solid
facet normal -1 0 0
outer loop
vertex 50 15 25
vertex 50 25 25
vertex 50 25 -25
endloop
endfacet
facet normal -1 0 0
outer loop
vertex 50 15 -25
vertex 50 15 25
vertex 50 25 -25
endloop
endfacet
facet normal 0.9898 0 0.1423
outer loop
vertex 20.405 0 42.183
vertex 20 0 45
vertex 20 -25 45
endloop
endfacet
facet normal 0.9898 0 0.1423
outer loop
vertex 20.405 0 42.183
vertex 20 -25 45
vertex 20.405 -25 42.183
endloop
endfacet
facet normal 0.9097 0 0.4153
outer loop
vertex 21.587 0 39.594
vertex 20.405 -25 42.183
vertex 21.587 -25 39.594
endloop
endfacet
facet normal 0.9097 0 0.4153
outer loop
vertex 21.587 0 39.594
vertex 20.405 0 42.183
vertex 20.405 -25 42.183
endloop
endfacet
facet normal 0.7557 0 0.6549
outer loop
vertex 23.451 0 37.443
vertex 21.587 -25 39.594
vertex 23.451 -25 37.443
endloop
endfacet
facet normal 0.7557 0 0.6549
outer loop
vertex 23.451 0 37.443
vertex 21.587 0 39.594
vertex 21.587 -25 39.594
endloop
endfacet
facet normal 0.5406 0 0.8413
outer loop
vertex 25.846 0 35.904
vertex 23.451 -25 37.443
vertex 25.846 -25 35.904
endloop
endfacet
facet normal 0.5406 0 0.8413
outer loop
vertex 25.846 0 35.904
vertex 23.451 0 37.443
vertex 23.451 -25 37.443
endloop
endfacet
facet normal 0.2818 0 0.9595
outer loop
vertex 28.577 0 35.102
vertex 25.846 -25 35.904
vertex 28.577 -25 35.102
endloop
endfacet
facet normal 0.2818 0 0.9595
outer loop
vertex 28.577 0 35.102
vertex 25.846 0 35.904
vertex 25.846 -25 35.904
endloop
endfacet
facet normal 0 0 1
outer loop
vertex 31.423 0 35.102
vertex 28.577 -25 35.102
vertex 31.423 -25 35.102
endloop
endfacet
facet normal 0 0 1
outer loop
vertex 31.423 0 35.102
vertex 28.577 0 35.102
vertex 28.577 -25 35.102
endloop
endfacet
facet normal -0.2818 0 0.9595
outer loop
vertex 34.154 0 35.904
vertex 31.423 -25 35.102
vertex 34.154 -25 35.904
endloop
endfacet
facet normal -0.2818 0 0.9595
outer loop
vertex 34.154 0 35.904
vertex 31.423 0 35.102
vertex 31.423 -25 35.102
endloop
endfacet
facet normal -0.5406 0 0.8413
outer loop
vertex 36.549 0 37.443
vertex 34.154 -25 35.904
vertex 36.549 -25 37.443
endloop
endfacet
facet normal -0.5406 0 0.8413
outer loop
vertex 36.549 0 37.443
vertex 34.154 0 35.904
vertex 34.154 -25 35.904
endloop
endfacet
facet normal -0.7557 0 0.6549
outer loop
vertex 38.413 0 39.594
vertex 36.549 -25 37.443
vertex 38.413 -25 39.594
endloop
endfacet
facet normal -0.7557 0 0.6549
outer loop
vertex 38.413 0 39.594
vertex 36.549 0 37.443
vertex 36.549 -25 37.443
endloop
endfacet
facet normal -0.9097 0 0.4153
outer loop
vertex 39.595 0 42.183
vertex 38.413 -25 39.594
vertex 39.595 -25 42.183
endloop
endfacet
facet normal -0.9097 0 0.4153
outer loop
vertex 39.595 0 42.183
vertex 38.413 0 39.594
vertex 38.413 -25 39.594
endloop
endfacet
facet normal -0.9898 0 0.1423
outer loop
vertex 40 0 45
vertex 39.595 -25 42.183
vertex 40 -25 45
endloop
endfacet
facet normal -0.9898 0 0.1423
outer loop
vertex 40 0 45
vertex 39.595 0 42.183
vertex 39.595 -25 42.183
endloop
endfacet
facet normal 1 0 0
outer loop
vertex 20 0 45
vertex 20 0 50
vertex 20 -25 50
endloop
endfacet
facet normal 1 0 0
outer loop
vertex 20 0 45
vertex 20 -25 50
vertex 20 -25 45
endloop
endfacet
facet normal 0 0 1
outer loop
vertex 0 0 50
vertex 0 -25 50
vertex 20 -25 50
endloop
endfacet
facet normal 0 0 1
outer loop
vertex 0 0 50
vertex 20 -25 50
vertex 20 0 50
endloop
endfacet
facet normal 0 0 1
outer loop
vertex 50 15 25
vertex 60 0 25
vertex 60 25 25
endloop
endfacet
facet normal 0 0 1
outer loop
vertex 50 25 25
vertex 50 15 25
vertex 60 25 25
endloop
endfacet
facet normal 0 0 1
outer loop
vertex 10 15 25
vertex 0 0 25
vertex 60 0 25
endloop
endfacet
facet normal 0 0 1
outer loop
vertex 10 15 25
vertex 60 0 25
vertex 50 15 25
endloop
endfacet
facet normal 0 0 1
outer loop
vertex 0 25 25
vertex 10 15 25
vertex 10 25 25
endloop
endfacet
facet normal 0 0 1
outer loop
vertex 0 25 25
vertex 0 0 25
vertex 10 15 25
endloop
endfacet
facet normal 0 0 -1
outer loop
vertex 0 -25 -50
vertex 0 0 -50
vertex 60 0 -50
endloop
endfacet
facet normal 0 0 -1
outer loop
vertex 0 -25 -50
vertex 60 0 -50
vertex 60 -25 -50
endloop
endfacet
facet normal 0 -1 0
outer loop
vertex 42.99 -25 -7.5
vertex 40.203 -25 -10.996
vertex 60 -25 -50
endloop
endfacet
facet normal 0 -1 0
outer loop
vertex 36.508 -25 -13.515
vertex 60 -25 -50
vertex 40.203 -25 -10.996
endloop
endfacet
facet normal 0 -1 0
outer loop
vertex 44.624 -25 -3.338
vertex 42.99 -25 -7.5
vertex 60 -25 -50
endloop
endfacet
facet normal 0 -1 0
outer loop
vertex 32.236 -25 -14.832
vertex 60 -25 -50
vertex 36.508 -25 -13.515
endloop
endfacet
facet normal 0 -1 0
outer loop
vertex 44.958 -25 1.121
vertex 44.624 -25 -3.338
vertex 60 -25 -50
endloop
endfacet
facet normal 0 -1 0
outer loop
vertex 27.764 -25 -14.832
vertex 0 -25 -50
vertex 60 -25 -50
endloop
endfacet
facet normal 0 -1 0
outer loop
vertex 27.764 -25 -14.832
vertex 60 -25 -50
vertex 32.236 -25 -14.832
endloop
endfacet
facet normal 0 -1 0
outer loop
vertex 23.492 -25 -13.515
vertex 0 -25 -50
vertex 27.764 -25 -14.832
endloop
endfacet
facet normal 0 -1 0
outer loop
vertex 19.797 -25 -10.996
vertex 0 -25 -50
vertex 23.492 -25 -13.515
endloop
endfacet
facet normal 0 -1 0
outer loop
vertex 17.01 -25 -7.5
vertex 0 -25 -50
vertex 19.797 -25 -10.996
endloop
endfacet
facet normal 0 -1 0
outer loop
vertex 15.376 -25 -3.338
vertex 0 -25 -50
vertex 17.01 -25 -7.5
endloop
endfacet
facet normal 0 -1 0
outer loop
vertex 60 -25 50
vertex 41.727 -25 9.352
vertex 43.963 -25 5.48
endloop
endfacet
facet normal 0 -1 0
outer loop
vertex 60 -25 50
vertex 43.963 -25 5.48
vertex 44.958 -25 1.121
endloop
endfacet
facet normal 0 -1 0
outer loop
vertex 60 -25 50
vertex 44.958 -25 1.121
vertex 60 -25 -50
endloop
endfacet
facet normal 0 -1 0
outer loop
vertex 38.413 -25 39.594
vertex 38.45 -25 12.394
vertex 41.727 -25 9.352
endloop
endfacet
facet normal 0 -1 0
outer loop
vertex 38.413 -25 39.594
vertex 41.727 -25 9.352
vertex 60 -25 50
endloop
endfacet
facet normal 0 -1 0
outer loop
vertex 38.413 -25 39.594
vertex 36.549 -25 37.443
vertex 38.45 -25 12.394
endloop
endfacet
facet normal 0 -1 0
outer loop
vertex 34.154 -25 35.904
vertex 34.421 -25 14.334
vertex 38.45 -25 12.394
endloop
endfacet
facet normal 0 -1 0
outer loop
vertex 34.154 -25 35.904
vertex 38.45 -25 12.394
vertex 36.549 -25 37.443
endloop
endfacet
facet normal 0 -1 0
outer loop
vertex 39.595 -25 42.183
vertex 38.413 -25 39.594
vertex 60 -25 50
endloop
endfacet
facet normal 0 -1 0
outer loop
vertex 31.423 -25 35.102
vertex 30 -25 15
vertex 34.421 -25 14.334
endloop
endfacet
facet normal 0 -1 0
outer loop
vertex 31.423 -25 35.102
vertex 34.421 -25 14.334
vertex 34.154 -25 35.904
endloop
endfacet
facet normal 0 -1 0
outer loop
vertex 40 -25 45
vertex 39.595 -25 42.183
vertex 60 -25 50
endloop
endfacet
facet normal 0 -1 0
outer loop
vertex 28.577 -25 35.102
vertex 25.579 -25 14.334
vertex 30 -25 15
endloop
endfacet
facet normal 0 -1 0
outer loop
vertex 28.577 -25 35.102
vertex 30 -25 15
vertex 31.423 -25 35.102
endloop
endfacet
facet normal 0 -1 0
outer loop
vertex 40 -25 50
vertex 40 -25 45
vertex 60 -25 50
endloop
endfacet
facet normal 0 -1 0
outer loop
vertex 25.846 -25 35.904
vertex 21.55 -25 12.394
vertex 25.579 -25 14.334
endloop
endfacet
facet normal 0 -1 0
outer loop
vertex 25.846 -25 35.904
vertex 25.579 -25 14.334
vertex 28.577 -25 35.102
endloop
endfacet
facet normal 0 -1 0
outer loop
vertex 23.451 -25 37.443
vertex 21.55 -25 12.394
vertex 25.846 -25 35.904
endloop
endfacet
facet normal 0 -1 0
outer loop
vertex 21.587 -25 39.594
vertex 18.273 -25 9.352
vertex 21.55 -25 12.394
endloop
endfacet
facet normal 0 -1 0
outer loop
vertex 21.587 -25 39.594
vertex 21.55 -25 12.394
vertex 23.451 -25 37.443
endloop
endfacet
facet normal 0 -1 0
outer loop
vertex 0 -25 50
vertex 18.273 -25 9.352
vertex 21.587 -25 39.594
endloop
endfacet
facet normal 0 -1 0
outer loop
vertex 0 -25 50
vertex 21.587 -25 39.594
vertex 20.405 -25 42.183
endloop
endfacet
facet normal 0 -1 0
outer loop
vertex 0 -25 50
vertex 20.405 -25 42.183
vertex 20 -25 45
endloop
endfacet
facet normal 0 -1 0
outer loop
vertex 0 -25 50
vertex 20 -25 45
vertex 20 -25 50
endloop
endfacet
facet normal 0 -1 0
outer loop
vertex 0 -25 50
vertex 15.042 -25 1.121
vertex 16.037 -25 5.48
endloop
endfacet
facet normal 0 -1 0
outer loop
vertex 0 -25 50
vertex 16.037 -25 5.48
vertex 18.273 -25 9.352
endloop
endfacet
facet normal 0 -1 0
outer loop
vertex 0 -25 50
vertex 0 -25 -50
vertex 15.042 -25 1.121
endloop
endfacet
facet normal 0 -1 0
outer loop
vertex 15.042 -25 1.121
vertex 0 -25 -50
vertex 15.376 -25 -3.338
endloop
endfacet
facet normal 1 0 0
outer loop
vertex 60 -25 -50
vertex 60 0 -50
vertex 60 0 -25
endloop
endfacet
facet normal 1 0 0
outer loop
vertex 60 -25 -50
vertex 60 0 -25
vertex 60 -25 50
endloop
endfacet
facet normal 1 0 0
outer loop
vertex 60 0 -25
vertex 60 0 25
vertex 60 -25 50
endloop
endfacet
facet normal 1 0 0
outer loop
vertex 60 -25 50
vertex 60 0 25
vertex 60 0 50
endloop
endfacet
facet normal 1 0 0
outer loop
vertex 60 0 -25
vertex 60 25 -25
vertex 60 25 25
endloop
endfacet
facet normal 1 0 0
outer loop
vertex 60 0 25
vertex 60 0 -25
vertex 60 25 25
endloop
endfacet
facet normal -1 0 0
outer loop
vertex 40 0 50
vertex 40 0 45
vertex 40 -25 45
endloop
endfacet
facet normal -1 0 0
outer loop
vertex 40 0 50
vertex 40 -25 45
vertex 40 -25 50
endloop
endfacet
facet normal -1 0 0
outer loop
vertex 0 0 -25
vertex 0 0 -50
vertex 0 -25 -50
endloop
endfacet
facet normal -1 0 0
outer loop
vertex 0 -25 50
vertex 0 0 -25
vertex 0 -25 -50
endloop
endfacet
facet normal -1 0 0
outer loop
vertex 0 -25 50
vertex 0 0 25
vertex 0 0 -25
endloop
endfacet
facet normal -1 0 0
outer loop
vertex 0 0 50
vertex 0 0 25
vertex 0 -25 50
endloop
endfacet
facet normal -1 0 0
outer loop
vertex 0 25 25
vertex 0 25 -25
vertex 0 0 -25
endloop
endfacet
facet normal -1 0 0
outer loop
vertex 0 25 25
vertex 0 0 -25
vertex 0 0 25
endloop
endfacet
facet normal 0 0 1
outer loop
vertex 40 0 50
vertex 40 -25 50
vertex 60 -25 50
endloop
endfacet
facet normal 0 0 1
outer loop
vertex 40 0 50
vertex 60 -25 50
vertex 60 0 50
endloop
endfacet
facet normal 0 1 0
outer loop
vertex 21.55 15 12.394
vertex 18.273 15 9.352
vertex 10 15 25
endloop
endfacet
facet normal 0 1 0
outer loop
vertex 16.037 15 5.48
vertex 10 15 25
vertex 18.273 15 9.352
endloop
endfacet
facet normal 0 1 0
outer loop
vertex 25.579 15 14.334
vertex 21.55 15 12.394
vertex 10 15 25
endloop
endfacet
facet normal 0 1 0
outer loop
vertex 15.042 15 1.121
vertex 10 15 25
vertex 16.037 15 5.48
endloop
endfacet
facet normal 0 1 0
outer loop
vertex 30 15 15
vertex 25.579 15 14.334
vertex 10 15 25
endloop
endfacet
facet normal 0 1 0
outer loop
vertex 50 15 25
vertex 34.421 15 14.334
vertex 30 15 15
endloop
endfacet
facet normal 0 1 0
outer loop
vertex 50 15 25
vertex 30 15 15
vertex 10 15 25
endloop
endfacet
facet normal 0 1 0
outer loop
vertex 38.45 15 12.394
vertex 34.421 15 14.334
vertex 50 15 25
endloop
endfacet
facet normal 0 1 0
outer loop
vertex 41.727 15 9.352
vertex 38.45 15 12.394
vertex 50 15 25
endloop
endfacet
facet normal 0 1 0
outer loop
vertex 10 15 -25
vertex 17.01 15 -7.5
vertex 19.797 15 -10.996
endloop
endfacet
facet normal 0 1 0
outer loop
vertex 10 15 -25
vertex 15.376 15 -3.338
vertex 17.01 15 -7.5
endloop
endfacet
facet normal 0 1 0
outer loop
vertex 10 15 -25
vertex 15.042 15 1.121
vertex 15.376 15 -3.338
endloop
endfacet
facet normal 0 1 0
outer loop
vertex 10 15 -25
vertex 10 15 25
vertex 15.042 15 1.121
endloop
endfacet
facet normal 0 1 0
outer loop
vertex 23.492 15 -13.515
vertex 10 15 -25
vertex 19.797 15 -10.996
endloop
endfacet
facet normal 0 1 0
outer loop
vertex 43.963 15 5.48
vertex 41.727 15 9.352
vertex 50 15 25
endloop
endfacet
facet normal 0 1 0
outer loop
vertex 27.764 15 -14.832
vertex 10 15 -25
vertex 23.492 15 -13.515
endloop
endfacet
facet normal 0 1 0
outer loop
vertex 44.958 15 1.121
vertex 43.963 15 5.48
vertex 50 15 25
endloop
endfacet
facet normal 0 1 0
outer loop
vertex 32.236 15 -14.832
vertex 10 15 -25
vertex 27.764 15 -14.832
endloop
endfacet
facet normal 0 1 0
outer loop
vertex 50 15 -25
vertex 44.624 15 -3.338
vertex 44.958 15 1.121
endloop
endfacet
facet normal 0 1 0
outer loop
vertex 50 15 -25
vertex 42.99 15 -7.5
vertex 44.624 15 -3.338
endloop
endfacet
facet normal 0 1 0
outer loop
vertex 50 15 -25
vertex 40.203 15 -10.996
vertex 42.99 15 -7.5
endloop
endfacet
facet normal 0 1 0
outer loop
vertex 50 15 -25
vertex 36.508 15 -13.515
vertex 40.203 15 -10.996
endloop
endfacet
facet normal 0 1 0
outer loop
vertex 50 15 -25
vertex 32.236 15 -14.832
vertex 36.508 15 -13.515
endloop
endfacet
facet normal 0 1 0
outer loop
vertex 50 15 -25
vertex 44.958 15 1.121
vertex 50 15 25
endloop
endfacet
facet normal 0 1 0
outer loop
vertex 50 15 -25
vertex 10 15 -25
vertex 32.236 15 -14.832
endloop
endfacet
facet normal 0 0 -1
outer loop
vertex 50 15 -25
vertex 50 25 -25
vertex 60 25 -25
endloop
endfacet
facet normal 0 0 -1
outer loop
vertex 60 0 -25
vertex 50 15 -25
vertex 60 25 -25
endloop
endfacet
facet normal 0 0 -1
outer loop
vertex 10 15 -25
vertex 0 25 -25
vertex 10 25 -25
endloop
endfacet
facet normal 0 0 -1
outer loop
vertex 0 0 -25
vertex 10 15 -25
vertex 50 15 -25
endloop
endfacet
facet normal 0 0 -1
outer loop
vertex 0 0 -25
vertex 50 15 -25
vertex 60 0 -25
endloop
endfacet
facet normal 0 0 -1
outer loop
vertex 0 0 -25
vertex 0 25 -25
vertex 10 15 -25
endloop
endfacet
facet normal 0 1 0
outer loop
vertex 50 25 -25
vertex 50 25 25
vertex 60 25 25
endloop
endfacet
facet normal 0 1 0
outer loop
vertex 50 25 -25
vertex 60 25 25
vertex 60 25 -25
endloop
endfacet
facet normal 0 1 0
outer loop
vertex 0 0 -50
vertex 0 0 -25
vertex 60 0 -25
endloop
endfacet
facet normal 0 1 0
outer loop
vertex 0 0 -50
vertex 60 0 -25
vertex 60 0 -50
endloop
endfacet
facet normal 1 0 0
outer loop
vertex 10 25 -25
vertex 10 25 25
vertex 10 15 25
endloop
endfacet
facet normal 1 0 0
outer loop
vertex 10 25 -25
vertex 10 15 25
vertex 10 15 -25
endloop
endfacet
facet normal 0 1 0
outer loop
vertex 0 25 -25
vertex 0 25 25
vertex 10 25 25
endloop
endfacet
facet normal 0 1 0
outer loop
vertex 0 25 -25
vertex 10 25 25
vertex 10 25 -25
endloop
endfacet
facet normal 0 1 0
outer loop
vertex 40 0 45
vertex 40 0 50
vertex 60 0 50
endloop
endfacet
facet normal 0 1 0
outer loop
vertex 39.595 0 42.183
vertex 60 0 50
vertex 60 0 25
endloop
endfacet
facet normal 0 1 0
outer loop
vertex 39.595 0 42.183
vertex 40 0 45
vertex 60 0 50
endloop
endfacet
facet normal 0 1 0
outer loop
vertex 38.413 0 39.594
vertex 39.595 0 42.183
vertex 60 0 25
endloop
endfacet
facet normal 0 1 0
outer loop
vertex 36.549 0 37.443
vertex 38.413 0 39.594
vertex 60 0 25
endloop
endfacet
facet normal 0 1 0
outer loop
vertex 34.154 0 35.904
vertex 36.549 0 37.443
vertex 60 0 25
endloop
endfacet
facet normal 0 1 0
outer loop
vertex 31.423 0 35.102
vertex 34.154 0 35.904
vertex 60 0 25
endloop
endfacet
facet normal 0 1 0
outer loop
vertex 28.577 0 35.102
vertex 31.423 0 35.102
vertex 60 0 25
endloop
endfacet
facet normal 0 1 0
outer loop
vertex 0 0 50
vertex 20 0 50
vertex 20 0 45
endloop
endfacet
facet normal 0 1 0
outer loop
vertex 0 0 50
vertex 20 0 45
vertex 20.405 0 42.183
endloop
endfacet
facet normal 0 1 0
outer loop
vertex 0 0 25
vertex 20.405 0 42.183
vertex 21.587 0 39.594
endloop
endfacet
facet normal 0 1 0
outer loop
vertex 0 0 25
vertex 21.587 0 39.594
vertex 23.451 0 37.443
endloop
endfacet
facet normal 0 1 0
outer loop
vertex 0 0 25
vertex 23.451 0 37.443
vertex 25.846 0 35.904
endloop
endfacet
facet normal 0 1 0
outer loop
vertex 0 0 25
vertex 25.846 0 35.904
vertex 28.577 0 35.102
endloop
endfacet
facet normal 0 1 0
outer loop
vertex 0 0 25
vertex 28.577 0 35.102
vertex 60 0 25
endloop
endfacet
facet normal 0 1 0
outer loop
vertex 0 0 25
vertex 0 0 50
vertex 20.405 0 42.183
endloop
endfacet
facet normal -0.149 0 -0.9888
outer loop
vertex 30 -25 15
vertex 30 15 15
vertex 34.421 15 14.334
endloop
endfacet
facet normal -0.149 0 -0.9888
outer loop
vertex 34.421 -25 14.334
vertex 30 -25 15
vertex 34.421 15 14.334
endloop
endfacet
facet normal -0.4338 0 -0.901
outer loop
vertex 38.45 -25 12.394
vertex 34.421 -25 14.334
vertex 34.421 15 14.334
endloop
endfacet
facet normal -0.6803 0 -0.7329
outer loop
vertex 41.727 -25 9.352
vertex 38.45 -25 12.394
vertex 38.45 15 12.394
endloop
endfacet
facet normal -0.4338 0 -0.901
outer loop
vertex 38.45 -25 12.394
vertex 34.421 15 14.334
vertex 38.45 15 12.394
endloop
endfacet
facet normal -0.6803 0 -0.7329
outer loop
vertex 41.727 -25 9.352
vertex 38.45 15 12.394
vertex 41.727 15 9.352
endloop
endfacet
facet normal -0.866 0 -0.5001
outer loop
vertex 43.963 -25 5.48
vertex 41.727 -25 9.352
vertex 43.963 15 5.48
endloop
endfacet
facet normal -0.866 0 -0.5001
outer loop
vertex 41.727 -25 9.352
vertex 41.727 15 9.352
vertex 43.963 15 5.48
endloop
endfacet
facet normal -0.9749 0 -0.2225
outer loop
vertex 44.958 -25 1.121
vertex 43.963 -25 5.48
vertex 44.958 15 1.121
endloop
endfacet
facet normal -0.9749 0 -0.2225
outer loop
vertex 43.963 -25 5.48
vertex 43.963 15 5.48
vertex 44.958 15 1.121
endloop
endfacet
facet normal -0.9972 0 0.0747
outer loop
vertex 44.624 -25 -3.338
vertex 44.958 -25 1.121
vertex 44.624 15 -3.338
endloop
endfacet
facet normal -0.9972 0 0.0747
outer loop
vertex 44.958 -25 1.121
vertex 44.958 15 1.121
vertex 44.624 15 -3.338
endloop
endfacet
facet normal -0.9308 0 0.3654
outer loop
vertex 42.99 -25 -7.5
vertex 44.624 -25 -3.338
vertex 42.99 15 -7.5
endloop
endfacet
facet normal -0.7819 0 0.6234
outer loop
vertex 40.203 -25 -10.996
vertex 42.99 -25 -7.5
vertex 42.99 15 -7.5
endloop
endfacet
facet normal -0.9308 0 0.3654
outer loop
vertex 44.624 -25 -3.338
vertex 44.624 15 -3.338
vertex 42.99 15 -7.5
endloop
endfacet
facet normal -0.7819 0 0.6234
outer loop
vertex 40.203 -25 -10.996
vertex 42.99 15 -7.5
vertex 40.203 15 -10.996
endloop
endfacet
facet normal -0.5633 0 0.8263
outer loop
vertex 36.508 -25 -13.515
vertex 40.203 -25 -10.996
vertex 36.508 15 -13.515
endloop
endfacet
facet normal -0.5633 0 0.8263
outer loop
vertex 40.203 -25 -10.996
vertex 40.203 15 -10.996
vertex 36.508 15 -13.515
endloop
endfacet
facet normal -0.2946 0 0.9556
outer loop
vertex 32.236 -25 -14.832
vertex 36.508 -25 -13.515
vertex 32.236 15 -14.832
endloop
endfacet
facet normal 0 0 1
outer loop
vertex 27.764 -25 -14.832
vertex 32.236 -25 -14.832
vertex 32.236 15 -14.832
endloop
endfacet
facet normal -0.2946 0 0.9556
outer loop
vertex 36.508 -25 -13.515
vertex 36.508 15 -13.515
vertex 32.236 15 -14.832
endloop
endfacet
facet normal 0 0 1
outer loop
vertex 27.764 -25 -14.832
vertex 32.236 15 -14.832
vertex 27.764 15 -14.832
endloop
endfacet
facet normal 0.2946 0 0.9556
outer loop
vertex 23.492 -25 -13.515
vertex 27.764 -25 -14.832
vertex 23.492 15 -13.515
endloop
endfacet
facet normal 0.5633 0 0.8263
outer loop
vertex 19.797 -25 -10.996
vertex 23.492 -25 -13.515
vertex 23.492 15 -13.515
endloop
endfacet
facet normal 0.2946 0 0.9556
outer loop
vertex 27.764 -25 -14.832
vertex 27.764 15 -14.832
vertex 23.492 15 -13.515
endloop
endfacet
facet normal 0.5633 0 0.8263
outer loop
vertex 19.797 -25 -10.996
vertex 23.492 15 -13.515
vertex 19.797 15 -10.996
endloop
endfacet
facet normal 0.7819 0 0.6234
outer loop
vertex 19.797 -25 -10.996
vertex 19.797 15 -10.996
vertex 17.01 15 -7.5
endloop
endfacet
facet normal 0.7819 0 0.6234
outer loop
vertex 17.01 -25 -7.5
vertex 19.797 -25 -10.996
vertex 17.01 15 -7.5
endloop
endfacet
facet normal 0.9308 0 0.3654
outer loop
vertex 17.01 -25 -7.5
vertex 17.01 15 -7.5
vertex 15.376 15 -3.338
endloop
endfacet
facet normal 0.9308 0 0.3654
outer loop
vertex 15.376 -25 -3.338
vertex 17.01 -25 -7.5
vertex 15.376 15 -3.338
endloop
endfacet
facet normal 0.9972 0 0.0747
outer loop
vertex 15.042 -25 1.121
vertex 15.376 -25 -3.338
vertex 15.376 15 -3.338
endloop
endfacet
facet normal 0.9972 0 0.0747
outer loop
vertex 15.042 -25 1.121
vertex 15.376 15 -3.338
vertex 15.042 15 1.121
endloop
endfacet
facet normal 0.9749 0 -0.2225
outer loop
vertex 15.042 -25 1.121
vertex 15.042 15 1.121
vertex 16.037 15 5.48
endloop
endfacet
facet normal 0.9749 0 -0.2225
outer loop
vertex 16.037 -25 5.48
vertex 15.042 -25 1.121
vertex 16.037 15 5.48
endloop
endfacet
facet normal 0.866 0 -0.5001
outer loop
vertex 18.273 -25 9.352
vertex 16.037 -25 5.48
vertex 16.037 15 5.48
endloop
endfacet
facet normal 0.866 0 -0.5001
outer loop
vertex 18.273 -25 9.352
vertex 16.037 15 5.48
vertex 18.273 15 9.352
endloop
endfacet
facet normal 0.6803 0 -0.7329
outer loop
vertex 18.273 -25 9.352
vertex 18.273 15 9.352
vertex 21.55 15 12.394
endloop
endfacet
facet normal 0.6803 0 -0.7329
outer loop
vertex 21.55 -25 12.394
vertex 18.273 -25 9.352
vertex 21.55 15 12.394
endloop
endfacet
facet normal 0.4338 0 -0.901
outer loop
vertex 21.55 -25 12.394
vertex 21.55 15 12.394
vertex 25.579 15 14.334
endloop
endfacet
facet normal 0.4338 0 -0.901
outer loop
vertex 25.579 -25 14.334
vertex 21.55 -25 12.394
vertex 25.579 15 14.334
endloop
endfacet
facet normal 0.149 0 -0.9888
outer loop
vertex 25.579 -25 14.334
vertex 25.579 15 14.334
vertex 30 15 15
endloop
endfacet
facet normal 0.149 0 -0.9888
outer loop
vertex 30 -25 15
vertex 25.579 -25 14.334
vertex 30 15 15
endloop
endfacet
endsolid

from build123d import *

# Parameters (mm, degrees)
BOSS_EXTRU_1_DEPTH      = 60
ENL_V_MAT_EXTRU_1_DEPTH = 83.006097334
ESQUISSE3_W             = 40
ESQUISSE3_H             = 50
ENL_V_MAT_EXTRU_2_DEPTH = 10
ESQUISSE4_R             = 15
ENL_V_MAT_EXTRU_3_DEPTH = 88.749643874


with BuildPart() as part:
    # Esquisse1 → Boss.-Extru.1 (new body)
    with BuildSketch(Plane(origin=(0, 0, 0), x_dir=(0, 0, -1), z_dir=(1, 0, 0))):
        Polygon((-50, 0), (-25, 0), (-25, 25), (25, 25), (25, 0), (50, 0), (50, -25), (-50, -25), align=None)
    extrude(amount=BOSS_EXTRU_1_DEPTH)

    # Esquisse2 → Enlèv. mat.-Extru.1 (cut, through all)
    with BuildSketch(Plane(origin=(0, 0, 0), x_dir=(1, 0, 0), z_dir=(0, 1, 0))):
        with BuildLine():
            Line((40, -45), (40, -60))
            ThreePointArc((40, -60), (30, -70), (20, -60))
            Line((20, -60), (20, -45))
            ThreePointArc((20, -45), (30, -35), (40, -45))
        make_face()
    extrude(amount=-ENL_V_MAT_EXTRU_1_DEPTH, mode=Mode.SUBTRACT)

    # Esquisse3 → Enlèv. mat.-Extru.2 (cut)
    with BuildSketch(Plane(origin=(0, 25, 0), x_dir=(1, 0, 0), z_dir=(0, 1, 0))):
        with Locations((30, 0)):
            Rectangle(ESQUISSE3_W, ESQUISSE3_H)
    extrude(amount=-ENL_V_MAT_EXTRU_2_DEPTH, mode=Mode.SUBTRACT)

    # Esquisse4 → Enlèv. mat.-Extru.3 (cut, through all)
    with BuildSketch(Plane(origin=(0, 15, 0), x_dir=(1, 0, 0), z_dir=(0, 1, 0))):
        with Locations(Location((30, 0, 0), (0, 0, 270))):
            Circle(ESQUISSE4_R)
    extrude(amount=-ENL_V_MAT_EXTRU_3_DEPTH, mode=Mode.SUBTRACT)


solid = part.part
